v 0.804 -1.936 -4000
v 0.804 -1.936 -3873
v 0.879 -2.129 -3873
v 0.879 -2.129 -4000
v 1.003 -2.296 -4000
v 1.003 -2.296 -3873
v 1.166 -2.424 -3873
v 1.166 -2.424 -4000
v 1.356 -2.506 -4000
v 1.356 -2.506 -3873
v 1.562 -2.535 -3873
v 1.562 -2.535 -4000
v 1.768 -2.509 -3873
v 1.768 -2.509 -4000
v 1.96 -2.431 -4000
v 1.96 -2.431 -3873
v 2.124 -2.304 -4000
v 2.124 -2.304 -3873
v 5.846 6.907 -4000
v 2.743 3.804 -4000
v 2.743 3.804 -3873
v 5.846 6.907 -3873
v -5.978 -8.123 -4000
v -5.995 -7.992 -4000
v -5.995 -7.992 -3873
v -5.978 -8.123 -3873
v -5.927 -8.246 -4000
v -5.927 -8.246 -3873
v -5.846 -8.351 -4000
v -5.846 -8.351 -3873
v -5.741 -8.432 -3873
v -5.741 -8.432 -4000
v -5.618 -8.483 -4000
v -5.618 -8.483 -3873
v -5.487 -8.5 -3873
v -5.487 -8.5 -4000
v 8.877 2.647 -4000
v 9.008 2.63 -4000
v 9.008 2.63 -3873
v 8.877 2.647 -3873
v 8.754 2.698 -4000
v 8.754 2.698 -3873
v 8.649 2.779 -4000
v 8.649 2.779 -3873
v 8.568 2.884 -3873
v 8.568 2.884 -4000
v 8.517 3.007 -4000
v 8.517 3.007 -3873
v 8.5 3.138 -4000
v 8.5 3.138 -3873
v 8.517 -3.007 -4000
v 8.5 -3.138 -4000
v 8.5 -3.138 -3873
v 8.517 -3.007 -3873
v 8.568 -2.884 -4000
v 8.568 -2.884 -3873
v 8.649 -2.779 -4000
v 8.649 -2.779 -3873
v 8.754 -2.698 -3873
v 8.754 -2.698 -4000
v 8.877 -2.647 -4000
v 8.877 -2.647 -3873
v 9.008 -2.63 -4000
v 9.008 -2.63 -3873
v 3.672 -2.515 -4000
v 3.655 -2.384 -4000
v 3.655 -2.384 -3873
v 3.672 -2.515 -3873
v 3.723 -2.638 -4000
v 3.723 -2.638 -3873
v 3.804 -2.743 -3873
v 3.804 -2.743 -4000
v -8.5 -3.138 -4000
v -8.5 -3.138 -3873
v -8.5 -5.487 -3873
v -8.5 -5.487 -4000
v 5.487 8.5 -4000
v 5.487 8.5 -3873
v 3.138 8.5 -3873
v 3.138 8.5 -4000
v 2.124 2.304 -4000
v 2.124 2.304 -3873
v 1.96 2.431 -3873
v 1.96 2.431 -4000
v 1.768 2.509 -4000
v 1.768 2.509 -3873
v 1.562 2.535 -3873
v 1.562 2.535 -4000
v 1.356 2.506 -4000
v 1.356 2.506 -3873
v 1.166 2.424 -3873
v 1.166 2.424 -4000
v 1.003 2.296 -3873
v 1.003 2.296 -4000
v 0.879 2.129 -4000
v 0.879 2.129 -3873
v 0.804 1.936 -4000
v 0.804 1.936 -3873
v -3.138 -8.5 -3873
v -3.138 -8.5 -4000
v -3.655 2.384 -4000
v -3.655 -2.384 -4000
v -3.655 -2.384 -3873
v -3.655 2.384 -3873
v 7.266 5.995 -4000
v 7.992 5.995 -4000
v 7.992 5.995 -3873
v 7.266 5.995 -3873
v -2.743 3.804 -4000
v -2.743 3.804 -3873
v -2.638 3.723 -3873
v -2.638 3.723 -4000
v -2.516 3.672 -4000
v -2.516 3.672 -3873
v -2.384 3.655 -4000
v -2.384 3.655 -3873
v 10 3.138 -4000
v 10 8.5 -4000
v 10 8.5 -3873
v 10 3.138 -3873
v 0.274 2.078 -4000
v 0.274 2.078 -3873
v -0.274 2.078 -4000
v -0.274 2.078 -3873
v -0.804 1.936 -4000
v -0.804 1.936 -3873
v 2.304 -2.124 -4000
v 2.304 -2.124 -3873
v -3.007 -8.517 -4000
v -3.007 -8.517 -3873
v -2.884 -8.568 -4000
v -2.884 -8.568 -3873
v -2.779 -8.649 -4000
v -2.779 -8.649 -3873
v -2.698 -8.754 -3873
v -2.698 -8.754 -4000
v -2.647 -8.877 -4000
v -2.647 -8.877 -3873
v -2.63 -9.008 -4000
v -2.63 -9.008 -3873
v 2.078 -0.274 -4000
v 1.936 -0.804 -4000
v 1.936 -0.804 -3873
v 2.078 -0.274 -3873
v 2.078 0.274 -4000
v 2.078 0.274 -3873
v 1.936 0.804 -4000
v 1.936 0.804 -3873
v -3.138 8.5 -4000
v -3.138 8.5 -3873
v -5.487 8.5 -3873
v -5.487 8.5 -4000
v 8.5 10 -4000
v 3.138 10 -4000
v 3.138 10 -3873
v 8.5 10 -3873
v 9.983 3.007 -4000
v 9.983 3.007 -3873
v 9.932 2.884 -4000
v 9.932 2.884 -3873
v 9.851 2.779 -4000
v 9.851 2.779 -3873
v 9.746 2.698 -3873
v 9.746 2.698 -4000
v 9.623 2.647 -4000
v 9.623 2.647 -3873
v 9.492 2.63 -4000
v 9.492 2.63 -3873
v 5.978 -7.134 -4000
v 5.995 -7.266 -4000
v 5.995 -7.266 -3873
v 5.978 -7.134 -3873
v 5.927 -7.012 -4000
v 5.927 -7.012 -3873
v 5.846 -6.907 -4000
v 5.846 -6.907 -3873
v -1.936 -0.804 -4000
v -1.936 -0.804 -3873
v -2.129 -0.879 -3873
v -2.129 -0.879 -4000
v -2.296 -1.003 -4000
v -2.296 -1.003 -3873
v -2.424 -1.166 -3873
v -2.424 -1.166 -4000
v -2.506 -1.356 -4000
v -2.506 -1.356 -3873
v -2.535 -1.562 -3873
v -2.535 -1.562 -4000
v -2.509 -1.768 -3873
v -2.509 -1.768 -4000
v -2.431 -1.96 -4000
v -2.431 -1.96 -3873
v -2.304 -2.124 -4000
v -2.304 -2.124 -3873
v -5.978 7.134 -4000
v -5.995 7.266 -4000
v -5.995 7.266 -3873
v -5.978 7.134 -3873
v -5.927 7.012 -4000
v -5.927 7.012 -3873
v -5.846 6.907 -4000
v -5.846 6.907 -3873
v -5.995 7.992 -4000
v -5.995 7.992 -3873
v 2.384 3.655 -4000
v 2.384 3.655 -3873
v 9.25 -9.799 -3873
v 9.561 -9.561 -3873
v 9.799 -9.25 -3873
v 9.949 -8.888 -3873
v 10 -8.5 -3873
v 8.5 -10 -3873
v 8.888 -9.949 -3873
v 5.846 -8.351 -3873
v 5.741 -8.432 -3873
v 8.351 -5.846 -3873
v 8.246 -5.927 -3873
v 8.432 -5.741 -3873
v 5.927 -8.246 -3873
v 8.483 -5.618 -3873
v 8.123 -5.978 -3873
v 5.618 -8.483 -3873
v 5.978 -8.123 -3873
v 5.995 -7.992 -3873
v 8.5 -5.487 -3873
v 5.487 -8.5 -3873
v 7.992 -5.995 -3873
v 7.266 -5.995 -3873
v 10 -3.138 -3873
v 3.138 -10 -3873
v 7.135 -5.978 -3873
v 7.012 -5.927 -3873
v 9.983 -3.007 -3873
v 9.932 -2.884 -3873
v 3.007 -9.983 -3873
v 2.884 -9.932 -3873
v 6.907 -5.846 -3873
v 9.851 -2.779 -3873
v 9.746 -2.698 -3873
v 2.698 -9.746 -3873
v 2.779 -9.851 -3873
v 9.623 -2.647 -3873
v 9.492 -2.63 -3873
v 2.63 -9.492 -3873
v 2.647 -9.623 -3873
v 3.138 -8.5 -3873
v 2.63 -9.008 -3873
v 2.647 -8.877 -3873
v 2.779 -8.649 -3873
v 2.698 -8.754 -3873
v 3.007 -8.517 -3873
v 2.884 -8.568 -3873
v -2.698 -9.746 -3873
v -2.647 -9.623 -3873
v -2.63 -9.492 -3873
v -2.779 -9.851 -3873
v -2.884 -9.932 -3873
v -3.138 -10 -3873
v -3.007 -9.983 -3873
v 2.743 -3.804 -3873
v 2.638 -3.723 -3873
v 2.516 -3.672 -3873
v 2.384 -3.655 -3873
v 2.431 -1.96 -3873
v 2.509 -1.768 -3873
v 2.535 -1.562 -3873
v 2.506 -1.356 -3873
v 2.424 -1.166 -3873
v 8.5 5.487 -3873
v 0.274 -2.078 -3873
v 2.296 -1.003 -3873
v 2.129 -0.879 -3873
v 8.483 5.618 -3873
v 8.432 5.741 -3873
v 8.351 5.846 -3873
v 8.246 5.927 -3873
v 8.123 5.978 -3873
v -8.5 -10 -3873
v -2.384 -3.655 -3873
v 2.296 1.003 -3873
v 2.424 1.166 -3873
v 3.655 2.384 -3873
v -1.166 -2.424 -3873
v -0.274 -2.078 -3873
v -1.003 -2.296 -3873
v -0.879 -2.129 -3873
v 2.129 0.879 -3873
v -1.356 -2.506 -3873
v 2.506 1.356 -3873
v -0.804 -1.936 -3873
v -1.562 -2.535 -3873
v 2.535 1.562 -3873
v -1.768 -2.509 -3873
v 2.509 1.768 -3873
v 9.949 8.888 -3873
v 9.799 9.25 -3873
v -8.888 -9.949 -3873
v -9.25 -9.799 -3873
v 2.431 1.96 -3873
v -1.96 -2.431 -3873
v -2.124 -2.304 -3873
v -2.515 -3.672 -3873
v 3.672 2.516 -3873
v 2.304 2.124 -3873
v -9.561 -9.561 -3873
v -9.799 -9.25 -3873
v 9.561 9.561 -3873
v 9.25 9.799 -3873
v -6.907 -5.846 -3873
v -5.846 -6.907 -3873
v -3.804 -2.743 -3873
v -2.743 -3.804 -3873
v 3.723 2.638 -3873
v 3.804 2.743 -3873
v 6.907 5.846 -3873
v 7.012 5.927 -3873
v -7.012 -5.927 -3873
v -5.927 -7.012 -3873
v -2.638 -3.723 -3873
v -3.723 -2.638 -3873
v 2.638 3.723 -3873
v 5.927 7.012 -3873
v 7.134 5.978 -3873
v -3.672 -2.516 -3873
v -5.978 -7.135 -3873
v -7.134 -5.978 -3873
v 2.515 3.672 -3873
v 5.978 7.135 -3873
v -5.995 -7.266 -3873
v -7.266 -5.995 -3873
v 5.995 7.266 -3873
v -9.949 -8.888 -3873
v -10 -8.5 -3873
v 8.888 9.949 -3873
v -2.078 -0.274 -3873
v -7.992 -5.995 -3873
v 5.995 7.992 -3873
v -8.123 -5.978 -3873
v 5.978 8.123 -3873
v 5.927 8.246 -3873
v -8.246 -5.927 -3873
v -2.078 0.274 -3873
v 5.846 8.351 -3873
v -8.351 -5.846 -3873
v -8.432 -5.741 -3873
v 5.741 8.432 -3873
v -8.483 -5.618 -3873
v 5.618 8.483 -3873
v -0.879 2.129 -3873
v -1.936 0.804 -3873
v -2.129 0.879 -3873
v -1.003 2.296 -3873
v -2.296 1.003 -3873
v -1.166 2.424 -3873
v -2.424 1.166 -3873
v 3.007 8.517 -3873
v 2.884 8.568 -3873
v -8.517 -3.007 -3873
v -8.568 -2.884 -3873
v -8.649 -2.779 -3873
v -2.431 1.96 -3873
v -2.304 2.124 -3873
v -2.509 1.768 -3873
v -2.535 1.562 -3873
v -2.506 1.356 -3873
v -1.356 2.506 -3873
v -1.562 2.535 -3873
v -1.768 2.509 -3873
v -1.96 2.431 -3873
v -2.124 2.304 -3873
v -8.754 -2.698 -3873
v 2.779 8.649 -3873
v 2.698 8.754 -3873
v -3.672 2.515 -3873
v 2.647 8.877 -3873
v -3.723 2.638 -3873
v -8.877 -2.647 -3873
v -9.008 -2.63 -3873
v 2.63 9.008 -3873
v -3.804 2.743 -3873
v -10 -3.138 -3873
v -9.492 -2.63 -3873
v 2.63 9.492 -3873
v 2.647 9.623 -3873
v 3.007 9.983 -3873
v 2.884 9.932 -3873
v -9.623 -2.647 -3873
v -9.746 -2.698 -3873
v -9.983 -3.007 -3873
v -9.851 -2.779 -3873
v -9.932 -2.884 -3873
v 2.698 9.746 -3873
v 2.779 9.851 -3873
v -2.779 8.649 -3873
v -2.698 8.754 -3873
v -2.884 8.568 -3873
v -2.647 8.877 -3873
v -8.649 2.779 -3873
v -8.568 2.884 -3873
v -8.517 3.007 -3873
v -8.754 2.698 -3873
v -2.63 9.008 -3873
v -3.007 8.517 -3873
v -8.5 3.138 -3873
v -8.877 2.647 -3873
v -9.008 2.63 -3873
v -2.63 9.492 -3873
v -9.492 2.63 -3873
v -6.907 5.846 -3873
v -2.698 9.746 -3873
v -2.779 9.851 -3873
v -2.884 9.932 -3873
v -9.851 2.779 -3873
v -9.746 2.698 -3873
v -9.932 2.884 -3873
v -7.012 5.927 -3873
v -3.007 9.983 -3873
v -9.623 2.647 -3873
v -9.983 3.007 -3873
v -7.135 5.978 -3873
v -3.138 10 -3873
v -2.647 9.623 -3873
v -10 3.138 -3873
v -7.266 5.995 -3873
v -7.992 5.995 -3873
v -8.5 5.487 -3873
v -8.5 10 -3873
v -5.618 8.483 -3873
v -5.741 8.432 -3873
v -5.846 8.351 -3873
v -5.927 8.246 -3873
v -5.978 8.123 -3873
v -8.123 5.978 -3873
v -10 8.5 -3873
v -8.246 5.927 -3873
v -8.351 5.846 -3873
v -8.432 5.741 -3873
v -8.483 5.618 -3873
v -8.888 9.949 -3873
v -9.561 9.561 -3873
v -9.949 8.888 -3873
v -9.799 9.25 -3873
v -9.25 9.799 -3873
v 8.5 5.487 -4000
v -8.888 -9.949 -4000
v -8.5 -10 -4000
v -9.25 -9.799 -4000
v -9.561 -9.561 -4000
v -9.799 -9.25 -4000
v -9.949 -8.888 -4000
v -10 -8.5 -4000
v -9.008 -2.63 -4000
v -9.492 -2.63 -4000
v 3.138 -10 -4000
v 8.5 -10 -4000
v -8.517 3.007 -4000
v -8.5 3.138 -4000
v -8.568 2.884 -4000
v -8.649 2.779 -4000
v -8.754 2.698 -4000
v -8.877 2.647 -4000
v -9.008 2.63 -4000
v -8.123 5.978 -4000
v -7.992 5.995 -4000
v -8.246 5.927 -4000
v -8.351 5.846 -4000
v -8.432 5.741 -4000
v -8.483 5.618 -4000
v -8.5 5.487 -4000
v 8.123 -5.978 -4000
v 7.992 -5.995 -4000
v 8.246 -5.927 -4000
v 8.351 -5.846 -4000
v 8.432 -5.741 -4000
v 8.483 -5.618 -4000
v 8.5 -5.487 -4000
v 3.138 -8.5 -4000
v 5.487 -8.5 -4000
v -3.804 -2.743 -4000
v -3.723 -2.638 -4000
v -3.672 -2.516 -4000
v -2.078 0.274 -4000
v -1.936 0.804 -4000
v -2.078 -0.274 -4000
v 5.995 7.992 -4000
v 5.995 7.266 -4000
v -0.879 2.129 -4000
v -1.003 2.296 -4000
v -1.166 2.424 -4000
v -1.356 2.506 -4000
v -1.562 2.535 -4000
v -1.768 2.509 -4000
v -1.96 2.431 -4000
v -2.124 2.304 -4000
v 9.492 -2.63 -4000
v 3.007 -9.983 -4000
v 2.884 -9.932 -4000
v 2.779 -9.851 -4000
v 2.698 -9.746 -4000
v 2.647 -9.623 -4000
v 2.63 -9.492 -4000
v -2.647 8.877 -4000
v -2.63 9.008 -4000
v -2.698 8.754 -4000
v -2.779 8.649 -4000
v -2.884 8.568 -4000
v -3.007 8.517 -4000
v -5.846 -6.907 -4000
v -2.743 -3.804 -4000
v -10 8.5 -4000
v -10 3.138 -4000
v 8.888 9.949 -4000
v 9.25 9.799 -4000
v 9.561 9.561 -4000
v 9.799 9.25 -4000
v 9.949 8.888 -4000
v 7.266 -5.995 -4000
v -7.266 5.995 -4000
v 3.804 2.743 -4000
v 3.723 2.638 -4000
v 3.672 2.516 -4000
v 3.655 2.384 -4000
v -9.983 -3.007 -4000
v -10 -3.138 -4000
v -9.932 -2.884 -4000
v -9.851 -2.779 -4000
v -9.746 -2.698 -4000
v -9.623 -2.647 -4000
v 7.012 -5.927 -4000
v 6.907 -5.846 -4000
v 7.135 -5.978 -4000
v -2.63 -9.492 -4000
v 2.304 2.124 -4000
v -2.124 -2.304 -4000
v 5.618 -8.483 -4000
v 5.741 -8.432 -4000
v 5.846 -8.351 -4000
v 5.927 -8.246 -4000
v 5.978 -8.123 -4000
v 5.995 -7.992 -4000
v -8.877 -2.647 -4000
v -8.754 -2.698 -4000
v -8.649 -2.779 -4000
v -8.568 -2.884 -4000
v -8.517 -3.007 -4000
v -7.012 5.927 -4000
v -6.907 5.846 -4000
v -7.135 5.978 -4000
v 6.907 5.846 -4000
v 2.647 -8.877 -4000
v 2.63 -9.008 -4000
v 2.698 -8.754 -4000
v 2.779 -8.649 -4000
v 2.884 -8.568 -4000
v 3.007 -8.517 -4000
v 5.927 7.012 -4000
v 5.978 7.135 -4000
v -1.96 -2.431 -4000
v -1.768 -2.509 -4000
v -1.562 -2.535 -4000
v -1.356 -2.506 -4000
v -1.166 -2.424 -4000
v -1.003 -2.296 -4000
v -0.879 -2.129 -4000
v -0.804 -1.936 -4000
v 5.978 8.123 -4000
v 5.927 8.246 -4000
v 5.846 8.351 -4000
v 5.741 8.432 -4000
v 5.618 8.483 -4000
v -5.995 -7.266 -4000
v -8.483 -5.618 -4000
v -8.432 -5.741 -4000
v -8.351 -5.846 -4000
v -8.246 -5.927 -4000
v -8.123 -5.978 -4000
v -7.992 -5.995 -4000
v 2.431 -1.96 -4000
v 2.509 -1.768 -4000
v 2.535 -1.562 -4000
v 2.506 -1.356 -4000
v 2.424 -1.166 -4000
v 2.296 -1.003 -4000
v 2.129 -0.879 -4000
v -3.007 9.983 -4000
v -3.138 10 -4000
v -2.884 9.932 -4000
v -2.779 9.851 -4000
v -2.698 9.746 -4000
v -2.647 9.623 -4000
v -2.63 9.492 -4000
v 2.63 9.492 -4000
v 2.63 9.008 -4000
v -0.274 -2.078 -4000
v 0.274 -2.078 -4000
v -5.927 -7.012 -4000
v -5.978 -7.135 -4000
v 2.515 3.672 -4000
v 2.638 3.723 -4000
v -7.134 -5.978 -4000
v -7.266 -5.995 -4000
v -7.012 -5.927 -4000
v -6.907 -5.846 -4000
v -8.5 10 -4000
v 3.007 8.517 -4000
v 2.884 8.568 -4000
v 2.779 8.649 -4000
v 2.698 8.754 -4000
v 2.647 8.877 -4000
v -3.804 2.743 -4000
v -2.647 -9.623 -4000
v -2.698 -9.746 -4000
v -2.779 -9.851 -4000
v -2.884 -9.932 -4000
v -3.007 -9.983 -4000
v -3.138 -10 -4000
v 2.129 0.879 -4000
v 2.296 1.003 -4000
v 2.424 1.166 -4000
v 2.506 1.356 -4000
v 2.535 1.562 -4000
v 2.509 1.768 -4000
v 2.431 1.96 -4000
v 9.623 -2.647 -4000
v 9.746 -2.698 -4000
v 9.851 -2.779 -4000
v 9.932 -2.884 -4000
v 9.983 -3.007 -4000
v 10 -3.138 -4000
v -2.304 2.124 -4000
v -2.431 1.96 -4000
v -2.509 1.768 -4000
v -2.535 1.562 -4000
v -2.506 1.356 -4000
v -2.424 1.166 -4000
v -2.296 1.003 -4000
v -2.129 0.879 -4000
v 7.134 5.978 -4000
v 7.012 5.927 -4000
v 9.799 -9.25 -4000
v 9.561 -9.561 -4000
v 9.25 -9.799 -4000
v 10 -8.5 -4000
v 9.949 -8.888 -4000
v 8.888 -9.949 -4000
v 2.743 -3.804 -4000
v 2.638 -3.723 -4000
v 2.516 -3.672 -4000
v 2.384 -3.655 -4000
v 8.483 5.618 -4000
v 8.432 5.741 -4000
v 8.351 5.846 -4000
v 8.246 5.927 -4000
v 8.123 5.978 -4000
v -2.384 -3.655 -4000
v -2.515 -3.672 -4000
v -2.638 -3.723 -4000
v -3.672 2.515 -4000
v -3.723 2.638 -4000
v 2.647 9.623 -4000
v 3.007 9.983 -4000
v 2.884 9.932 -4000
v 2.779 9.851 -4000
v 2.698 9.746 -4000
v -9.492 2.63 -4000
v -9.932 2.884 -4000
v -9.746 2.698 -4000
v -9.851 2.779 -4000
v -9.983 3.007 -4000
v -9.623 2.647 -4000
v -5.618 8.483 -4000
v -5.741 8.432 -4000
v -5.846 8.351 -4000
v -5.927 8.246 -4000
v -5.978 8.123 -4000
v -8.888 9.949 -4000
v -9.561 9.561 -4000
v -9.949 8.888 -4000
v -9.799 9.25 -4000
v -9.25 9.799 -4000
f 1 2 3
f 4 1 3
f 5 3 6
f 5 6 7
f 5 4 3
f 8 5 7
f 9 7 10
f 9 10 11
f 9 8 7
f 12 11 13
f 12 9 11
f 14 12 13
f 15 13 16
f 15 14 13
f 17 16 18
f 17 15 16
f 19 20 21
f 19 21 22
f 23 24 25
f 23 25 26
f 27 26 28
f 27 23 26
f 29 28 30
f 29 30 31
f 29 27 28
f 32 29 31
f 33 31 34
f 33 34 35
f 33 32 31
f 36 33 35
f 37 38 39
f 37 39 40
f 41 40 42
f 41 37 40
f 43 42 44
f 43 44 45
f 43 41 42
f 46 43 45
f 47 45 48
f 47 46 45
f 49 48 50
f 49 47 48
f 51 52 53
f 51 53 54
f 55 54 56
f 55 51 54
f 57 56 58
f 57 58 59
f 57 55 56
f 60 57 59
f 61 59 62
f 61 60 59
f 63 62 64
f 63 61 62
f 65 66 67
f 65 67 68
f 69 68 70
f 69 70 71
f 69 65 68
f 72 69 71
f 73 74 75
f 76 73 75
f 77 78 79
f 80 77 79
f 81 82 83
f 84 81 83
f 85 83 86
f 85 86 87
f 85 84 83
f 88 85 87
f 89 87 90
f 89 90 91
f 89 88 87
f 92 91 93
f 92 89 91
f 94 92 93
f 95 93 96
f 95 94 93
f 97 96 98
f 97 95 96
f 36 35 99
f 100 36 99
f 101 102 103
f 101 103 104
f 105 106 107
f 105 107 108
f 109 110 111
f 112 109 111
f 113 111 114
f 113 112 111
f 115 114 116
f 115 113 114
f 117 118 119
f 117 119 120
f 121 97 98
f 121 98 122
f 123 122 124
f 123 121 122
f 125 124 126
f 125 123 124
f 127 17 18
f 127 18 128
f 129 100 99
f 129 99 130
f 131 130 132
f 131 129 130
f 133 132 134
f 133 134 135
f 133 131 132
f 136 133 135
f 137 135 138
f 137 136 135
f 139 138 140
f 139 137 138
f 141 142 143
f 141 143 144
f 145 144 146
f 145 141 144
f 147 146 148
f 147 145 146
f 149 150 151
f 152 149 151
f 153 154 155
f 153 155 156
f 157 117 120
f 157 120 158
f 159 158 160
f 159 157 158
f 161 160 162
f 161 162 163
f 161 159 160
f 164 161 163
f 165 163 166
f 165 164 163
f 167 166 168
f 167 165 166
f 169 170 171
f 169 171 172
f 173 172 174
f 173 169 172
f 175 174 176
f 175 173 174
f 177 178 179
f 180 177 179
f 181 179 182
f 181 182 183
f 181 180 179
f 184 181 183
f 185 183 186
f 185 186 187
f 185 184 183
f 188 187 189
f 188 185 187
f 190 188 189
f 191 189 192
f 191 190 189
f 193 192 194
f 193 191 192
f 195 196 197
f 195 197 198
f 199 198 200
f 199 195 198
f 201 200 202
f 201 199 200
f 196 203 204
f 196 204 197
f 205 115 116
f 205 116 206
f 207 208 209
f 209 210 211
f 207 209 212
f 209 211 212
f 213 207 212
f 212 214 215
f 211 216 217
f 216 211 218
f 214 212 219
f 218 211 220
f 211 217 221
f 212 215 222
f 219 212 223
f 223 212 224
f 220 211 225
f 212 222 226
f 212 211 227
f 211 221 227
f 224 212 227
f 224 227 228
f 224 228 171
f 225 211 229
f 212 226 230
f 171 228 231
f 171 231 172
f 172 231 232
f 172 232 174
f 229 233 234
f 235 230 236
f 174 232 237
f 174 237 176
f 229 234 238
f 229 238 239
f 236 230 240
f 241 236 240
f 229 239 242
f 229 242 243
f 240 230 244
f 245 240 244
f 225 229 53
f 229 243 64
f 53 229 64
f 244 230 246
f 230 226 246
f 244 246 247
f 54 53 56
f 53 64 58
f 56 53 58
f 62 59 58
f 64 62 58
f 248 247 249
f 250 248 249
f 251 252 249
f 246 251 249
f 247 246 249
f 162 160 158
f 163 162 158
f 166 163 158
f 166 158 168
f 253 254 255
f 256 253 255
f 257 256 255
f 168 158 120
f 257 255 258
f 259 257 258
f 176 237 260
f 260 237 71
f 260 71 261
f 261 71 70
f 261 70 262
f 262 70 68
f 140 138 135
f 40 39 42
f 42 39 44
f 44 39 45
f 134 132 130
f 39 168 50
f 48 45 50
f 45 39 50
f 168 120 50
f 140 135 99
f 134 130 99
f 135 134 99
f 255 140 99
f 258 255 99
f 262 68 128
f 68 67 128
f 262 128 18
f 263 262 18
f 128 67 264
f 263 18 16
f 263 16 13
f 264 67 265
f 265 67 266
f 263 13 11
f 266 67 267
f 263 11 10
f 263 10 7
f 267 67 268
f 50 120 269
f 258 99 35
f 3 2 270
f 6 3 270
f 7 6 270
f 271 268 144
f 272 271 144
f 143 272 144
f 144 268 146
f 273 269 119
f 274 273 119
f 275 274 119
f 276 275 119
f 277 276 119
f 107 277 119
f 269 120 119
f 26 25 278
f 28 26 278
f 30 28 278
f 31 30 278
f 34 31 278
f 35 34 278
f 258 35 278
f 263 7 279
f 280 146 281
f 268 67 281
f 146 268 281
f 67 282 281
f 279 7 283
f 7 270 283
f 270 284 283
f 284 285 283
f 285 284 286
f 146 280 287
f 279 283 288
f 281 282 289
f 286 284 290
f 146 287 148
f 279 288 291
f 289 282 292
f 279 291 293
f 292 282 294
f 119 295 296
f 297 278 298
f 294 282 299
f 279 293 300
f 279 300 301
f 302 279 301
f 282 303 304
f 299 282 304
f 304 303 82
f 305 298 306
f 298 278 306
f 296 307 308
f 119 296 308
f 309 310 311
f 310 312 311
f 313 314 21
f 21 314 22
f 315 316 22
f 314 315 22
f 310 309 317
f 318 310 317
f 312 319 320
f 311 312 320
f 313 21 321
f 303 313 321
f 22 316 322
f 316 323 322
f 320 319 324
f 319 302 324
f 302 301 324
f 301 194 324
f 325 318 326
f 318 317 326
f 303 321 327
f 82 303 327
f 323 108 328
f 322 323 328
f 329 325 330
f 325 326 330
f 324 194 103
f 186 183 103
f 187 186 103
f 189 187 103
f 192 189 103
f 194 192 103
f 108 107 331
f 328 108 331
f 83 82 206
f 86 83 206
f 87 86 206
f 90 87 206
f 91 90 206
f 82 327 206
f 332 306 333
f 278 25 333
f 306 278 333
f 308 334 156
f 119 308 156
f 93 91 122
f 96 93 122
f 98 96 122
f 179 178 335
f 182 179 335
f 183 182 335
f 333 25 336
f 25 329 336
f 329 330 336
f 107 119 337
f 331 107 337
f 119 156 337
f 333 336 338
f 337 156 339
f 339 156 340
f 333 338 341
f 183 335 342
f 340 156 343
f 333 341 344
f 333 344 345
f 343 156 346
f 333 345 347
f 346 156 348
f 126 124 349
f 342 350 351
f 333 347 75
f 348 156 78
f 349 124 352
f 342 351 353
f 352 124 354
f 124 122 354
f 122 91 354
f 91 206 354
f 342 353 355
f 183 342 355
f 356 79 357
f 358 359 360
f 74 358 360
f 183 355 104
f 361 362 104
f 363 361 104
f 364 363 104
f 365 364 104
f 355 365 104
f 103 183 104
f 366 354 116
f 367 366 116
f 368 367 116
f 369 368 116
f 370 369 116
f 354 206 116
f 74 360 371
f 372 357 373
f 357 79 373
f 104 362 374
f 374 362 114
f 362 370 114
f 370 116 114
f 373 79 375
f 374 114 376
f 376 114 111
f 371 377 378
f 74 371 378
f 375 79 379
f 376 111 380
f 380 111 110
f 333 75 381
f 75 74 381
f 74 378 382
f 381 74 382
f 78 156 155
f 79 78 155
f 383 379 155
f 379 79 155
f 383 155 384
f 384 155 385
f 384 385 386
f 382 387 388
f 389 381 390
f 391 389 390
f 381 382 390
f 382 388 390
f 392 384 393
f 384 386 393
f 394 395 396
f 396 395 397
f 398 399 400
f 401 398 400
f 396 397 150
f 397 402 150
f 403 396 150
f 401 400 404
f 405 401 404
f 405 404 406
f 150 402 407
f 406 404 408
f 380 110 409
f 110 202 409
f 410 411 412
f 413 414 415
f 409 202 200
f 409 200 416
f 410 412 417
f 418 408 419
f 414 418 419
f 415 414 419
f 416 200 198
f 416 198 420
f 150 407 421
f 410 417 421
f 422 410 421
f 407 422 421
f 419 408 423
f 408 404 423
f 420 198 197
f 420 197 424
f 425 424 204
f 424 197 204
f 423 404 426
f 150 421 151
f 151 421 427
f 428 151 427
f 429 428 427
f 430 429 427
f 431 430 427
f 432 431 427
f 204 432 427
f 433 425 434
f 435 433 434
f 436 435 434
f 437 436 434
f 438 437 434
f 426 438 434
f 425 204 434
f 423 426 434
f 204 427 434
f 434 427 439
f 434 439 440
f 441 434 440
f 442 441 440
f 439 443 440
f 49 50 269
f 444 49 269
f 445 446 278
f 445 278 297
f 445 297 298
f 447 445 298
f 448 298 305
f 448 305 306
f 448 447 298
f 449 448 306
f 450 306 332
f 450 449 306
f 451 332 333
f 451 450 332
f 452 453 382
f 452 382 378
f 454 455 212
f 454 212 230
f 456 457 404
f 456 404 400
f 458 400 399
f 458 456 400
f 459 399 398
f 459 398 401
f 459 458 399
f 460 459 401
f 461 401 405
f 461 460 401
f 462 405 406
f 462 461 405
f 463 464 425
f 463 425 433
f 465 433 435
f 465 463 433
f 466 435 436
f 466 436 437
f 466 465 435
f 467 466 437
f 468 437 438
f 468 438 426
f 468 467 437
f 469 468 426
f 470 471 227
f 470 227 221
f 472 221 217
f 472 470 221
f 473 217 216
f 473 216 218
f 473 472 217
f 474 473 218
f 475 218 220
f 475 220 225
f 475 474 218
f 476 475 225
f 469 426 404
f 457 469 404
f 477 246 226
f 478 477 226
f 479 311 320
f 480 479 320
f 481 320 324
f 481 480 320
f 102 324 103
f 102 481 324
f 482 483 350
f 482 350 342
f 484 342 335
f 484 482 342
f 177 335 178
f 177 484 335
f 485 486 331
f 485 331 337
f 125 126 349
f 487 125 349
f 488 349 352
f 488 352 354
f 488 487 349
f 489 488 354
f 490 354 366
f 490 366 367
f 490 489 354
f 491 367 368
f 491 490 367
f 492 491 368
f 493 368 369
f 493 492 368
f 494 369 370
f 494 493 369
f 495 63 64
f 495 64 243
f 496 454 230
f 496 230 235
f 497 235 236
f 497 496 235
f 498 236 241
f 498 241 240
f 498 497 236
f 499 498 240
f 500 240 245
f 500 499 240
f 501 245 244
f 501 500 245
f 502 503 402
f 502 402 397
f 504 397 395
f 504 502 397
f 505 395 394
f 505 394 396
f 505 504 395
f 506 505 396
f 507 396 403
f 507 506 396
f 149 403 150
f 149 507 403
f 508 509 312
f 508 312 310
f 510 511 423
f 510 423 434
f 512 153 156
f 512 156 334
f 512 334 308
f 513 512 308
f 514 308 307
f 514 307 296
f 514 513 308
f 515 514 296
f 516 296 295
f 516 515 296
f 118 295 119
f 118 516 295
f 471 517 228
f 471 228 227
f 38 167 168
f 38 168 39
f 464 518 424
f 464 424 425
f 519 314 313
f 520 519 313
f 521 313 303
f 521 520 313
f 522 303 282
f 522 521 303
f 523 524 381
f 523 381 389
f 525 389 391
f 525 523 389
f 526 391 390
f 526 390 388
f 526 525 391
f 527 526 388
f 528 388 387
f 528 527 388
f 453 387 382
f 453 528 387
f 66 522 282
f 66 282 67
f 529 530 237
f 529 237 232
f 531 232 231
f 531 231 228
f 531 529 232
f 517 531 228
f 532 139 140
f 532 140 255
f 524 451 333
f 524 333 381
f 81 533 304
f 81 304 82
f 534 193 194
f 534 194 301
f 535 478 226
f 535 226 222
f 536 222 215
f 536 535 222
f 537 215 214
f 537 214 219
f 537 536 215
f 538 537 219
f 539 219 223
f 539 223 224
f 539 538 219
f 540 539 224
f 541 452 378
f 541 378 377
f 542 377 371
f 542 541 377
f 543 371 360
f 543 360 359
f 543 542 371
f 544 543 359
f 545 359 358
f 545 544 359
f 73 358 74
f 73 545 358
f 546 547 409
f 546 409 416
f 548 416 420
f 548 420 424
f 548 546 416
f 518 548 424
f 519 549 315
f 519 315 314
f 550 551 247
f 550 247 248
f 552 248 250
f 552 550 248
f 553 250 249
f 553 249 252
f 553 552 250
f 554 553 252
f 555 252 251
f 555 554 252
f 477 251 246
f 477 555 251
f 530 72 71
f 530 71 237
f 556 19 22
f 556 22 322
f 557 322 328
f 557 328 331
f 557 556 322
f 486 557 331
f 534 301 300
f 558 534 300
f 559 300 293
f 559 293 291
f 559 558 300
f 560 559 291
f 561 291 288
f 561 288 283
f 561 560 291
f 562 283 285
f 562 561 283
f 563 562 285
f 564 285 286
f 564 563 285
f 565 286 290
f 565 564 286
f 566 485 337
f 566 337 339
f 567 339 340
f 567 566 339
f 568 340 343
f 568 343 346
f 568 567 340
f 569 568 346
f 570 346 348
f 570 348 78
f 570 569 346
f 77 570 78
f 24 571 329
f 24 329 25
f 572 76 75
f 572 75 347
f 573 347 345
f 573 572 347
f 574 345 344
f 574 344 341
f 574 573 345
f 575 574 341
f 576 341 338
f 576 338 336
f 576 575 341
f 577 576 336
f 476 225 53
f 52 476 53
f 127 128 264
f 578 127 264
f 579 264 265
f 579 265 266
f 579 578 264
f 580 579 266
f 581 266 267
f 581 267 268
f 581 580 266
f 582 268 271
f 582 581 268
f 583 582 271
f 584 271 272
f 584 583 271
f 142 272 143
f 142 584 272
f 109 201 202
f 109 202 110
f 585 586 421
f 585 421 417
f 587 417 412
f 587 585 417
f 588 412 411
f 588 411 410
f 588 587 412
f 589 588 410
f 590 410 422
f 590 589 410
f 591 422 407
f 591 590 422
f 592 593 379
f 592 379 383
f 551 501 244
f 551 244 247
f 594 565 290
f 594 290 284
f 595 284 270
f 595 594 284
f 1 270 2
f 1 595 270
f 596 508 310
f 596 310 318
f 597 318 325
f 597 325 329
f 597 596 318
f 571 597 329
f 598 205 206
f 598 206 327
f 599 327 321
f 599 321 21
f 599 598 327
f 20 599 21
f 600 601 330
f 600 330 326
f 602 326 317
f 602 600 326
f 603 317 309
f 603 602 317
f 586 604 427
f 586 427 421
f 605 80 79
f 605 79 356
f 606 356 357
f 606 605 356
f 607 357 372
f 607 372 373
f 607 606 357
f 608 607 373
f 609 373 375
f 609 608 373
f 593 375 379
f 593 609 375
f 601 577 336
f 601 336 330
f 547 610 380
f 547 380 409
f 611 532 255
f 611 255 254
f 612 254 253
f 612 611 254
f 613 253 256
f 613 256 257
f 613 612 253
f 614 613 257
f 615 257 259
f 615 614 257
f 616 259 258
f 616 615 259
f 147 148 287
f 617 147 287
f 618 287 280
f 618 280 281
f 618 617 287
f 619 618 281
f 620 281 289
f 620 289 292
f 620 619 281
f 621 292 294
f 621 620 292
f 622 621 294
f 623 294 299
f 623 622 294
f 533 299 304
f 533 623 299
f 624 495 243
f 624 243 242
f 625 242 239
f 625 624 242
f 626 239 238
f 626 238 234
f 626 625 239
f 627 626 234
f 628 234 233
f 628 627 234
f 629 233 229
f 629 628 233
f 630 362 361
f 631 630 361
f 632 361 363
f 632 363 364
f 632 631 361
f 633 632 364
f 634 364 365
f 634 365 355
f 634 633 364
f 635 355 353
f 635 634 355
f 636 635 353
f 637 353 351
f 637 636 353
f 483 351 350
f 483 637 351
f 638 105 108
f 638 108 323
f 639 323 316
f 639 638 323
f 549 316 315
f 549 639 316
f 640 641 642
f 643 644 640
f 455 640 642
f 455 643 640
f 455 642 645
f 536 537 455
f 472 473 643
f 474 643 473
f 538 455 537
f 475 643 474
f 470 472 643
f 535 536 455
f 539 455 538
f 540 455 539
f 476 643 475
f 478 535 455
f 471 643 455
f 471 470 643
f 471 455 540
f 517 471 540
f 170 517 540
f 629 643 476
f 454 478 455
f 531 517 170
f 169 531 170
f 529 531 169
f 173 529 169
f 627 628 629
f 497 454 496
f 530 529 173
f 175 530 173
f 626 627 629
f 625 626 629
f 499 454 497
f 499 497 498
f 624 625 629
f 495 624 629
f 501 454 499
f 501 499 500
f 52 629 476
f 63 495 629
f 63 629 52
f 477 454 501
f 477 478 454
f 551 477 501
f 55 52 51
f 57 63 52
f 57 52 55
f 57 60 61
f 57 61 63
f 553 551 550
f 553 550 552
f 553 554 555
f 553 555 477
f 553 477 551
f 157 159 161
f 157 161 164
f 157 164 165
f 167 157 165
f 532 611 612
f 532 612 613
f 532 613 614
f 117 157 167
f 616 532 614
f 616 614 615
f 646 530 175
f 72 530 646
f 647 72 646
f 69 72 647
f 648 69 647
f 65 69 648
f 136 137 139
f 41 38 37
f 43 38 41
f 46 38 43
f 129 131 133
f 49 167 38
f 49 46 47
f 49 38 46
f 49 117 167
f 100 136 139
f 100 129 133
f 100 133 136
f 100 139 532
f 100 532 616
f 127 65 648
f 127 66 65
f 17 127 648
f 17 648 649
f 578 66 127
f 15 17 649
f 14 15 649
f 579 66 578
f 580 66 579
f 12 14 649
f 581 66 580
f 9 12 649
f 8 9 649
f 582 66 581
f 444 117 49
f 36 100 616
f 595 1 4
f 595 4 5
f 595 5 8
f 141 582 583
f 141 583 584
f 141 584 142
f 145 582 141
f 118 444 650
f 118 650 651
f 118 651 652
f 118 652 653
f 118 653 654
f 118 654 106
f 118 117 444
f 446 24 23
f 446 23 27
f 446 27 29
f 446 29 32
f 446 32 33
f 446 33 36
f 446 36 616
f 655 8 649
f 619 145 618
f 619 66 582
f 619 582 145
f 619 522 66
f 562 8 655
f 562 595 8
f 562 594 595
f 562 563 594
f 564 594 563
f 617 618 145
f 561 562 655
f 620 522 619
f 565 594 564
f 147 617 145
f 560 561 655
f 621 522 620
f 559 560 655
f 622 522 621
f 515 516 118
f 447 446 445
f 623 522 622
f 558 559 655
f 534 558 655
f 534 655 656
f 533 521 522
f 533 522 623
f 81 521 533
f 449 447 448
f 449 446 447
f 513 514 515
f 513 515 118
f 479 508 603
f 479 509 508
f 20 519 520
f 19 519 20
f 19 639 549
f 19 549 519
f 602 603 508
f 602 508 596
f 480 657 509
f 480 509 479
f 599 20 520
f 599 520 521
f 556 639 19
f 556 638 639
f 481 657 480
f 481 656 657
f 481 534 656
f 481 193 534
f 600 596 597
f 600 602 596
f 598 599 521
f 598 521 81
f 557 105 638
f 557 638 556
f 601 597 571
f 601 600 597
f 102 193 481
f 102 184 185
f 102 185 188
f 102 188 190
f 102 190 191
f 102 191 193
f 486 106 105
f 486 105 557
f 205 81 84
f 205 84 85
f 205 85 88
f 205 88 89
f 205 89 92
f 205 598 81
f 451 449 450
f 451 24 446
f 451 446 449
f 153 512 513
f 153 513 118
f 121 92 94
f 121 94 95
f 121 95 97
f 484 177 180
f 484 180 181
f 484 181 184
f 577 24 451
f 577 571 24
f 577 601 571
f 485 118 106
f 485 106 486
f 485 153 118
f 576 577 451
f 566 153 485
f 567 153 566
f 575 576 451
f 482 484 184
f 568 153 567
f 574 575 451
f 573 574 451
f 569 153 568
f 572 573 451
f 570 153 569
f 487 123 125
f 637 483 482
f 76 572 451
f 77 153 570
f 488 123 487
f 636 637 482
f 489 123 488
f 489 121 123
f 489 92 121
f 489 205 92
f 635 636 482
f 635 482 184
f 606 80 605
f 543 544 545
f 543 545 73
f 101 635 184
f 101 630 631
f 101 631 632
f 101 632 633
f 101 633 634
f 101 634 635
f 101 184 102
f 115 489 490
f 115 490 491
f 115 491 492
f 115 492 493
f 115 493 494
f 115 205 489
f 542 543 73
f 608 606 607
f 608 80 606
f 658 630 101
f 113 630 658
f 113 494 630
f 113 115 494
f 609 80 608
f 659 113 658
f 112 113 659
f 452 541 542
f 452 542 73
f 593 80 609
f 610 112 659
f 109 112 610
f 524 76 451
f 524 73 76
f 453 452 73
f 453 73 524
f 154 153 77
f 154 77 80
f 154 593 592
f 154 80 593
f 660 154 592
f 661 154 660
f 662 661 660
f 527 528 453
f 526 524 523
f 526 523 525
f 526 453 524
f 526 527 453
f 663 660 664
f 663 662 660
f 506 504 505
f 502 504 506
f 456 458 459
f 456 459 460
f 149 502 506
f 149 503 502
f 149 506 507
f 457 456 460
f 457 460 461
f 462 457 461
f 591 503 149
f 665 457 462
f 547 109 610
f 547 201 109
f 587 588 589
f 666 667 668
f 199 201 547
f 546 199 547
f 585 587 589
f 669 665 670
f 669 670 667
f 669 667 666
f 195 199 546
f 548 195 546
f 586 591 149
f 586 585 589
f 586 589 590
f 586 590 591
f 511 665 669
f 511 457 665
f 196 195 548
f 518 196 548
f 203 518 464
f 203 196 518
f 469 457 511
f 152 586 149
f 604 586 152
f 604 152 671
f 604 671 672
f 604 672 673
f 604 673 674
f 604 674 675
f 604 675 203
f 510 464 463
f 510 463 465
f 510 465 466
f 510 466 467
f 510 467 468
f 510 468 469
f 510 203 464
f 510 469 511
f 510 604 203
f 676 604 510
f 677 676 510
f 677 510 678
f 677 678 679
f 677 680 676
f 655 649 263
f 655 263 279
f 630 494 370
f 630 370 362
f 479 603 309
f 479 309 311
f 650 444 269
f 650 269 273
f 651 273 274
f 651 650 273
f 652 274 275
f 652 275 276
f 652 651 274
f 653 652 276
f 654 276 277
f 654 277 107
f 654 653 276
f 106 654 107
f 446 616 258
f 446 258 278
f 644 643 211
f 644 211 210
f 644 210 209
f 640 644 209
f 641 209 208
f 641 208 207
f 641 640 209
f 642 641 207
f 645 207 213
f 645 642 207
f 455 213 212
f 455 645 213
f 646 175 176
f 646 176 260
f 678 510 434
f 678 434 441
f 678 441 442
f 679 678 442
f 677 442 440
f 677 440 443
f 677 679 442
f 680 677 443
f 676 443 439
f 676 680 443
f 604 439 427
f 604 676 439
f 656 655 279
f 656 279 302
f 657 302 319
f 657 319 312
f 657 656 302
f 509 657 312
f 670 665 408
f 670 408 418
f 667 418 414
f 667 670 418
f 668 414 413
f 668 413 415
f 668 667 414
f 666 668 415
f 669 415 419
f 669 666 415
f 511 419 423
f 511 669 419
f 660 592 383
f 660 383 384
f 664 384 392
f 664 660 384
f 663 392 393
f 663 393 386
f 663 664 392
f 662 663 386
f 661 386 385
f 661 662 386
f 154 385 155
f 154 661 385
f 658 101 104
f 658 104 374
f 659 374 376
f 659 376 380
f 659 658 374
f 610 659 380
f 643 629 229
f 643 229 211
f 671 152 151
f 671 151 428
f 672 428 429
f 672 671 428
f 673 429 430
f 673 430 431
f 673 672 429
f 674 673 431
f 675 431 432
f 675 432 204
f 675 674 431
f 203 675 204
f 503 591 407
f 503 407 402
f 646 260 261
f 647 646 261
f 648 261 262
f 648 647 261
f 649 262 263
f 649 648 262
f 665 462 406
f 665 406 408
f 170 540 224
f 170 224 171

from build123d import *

# Parameters (mm, degrees)
BOSS_EXTRUDE1_DEPTH = 127


with BuildPart() as part:
    # Sketch1 → Boss-Extrude1 (new body)
    with BuildSketch(Plane(origin=(0, 0, -4000), x_dir=(-1, 0, 0), z_dir=(0, 0, -1))):
        with BuildLine():
            Line((10, -8.5), (10, -3.138))
            ThreePointArc((10, -3.138), (9.851210245, -2.778789755), (9.492, -2.63))
            Line((9.492, -2.63), (9.008, -2.63))
            ThreePointArc((9.008, -2.63), (8.648789755, -2.778789755), (8.5, -3.138))
            Line((8.5, -3.138), (8.5, -5.487))
            ThreePointArc((8.5, -5.487), (8.351210245, -5.846210245), (7.992, -5.995))
            Line((7.992, -5.995), (7.26592049, -5.995))
            ThreePointArc((7.26592049, -5.995), (7.071517306, -5.956330803), (6.906710245, -5.846210245))
            Line((6.906710245, -5.846210245), (3.803789755, -2.743289755))
            ThreePointArc((3.803789755, -2.743289755), (3.693669197, -2.578482694), (3.655, -2.38407951))
            Line((3.655, -2.38407951), (3.655, 2.383759167))
            ThreePointArc((3.655, 2.383759167), (3.693669197, 2.57816235), (3.803789755, 2.742969412))
            Line((3.803789755, 2.742969412), (6.907030588, 5.846210245))
            ThreePointArc((6.907030588, 5.846210245), (7.07183765, 5.956330803), (7.266240833, 5.995))
            Line((7.266240833, 5.995), (7.992, 5.995))
            ThreePointArc((7.992, 5.995), (8.351210245, 5.846210245), (8.5, 5.487))
            Line((8.5, 5.487), (8.5, 3.138))
            ThreePointArc((8.5, 3.138), (8.648789755, 2.778789755), (9.008, 2.63))
            Line((9.008, 2.63), (9.492, 2.63))
            ThreePointArc((9.492, 2.63), (9.851210245, 2.778789755), (10, 3.138))
            Line((10, 3.138), (10, 8.5))
            ThreePointArc((10, 8.5), (9.560660172, 9.560660172), (8.5, 10))
            Line((8.5, 10), (3.138, 10))
            ThreePointArc((3.138, 10), (2.778789755, 9.851210245), (2.63, 9.492))
            Line((2.63, 9.492), (2.63, 9.008))
            ThreePointArc((2.63, 9.008), (2.778789755, 8.648789755), (3.138, 8.5))
            Line((3.138, 8.5), (5.487, 8.5))
            ThreePointArc((5.487, 8.5), (5.846210245, 8.351210245), (5.995, 7.992))
            Line((5.995, 7.992), (5.995, 7.26592049))
            ThreePointArc((5.995, 7.26592049), (5.956330803, 7.071517306), (5.846210245, 6.906710245))
            Line((5.846210245, 6.906710245), (2.743289755, 3.803789755))
            ThreePointArc((2.743289755, 3.803789755), (2.578482694, 3.693669197), (2.38407951, 3.655))
            Line((2.38407951, 3.655), (-2.383759167, 3.655))
            ThreePointArc((-2.383759167, 3.655), (-2.57816235, 3.693669197), (-2.742969412, 3.803789755))
            Line((-2.742969412, 3.803789755), (-5.846210245, 6.907030588))
            ThreePointArc((-5.846210245, 6.907030588), (-5.956330803, 7.07183765), (-5.995, 7.266240833))
            Line((-5.995, 7.266240833), (-5.995, 7.992))
            ThreePointArc((-5.995, 7.992), (-5.846210245, 8.351210245), (-5.487, 8.5))
            Line((-5.487, 8.5), (-3.138, 8.5))
            ThreePointArc((-3.138, 8.5), (-2.778789755, 8.648789755), (-2.63, 9.008))
            Line((-2.63, 9.008), (-2.63, 9.492))
            ThreePointArc((-2.63, 9.492), (-2.778789755, 9.851210245), (-3.138, 10))
            Line((-3.138, 10), (-8.5, 10))
            ThreePointArc((-8.5, 10), (-9.560660172, 9.560660172), (-10, 8.5))
            Line((-10, 8.5), (-10, 3.138))
            ThreePointArc((-10, 3.138), (-9.851210245, 2.778789755), (-9.492, 2.63))
            Line((-9.492, 2.63), (-9.008, 2.63))
            ThreePointArc((-9.008, 2.63), (-8.648789755, 2.778789755), (-8.5, 3.138))
            Line((-8.5, 3.138), (-8.5, 5.487))
            ThreePointArc((-8.5, 5.487), (-8.351210245, 5.846210245), (-7.992, 5.995))
            Line((-7.992, 5.995), (-7.26592049, 5.995))
            ThreePointArc((-7.26592049, 5.995), (-7.071517306, 5.956330803), (-6.906710245, 5.846210245))
            Line((-6.906710245, 5.846210245), (-3.803789755, 2.743289755))
            ThreePointArc((-3.803789755, 2.743289755), (-3.693669197, 2.578482694), (-3.655, 2.38407951))
            Line((-3.655, 2.38407951), (-3.655, -2.383759167))
            ThreePointArc((-3.655, -2.383759167), (-3.693669197, -2.57816235), (-3.803789755, -2.742969412))
            Line((-3.803789755, -2.742969412), (-6.907030588, -5.846210245))
            ThreePointArc((-6.907030588, -5.846210245), (-7.07183765, -5.956330803), (-7.266240833, -5.995))
            Line((-7.266240833, -5.995), (-7.992, -5.995))
            ThreePointArc((-7.992, -5.995), (-8.351210245, -5.846210245), (-8.5, -5.487))
            Line((-8.5, -5.487), (-8.5, -3.138))
            ThreePointArc((-8.5, -3.138), (-8.648789755, -2.778789755), (-9.008, -2.63))
            Line((-9.008, -2.63), (-9.492, -2.63))
            ThreePointArc((-9.492, -2.63), (-9.851210245, -2.778789755), (-10, -3.138))
            Line((-10, -3.138), (-10, -8.5))
            ThreePointArc((-10, -8.5), (-9.560660172, -9.560660172), (-8.5, -10))
            Line((-8.5, -10), (-3.138, -10))
            ThreePointArc((-3.138, -10), (-2.778789755, -9.851210245), (-2.63, -9.492))
            Line((-2.63, -9.492), (-2.63, -9.008))
            ThreePointArc((-2.63, -9.008), (-2.778789755, -8.648789755), (-3.138, -8.5))
            Line((-3.138, -8.5), (-5.487, -8.5))
            ThreePointArc((-5.487, -8.5), (-5.846210245, -8.351210245), (-5.995, -7.992))
            Line((-5.995, -7.992), (-5.995, -7.26592049))
            ThreePointArc((-5.995, -7.26592049), (-5.956330803, -7.071517306), (-5.846210245, -6.906710245))
            Line((-5.846210245, -6.906710245), (-2.743289755, -3.803789755))
            ThreePointArc((-2.743289755, -3.803789755), (-2.578482694, -3.693669197), (-2.38407951, -3.655))
            Line((-2.38407951, -3.655), (2.383759167, -3.655))
            ThreePointArc((2.383759167, -3.655), (2.57816235, -3.693669197), (2.742969412, -3.803789755))
            Line((2.742969412, -3.803789755), (5.846210245, -6.907030588))
            ThreePointArc((5.846210245, -6.907030588), (5.956330803, -7.07183765), (5.995, -7.266240833))
            Line((5.995, -7.266240833), (5.995, -7.992))
            ThreePointArc((5.995, -7.992), (5.846210245, -8.351210245), (5.487, -8.5))
            Line((5.487, -8.5), (3.138, -8.5))
            ThreePointArc((3.138, -8.5), (2.778789755, -8.648789755), (2.63, -9.008))
            Line((2.63, -9.008), (2.63, -9.492))
            ThreePointArc((2.63, -9.492), (2.778789755, -9.851210245), (3.138, -10))
            Line((3.138, -10), (8.5, -10))
            ThreePointArc((8.5, -10), (9.560660172, -9.560660172), (10, -8.5))
        make_face()
        with BuildLine():
            Line((2.304493037, -2.124493037), (2.124493037, -2.304493037))
            ThreePointArc((2.124493037, -2.304493037), (1.35638567, -2.506016078), (0.803729988, -1.935777391))
            ThreePointArc((0.803729988, -1.935777391), (0, -2.096), (-0.803729988, -1.935777391))
            ThreePointArc((-0.803729988, -1.935777391), (-1.35638567, -2.506016078), (-2.124493037, -2.304493037))
            Line((-2.124493037, -2.304493037), (-2.304493037, -2.124493037))
            ThreePointArc((-2.304493037, -2.124493037), (-2.506016078, -1.35638567), (-1.935777391, -0.803729988))
            ThreePointArc((-1.935777391, -0.803729988), (-2.096, 0), (-1.935777391, 0.803729988))
            ThreePointArc((-1.935777391, 0.803729988), (-2.506016078, 1.35638567), (-2.304493037, 2.124493037))
            Line((-2.304493037, 2.124493037), (-2.124493037, 2.304493037))
            ThreePointArc((-2.124493037, 2.304493037), (-1.35638567, 2.506016078), (-0.803729988, 1.935777391))
            ThreePointArc((-0.803729988, 1.935777391), (0, 2.096), (0.803729988, 1.935777391))
            ThreePointArc((0.803729988, 1.935777391), (1.35638567, 2.506016078), (2.124493037, 2.304493037))
            Line((2.124493037, 2.304493037), (2.304493037, 2.124493037))
            ThreePointArc((2.304493037, 2.124493037), (2.506016078, 1.35638567), (1.935777391, 0.803729988))
            ThreePointArc((1.935777391, 0.803729988), (2.096, 0), (1.935777391, -0.803729988))
            ThreePointArc((1.935777391, -0.803729988), (2.506016078, -1.35638567), (2.304493037, -2.124493037))
        make_face(mode=Mode.SUBTRACT)
    extrude(amount=-BOSS_EXTRUDE1_DEPTH)


solid = part.part
